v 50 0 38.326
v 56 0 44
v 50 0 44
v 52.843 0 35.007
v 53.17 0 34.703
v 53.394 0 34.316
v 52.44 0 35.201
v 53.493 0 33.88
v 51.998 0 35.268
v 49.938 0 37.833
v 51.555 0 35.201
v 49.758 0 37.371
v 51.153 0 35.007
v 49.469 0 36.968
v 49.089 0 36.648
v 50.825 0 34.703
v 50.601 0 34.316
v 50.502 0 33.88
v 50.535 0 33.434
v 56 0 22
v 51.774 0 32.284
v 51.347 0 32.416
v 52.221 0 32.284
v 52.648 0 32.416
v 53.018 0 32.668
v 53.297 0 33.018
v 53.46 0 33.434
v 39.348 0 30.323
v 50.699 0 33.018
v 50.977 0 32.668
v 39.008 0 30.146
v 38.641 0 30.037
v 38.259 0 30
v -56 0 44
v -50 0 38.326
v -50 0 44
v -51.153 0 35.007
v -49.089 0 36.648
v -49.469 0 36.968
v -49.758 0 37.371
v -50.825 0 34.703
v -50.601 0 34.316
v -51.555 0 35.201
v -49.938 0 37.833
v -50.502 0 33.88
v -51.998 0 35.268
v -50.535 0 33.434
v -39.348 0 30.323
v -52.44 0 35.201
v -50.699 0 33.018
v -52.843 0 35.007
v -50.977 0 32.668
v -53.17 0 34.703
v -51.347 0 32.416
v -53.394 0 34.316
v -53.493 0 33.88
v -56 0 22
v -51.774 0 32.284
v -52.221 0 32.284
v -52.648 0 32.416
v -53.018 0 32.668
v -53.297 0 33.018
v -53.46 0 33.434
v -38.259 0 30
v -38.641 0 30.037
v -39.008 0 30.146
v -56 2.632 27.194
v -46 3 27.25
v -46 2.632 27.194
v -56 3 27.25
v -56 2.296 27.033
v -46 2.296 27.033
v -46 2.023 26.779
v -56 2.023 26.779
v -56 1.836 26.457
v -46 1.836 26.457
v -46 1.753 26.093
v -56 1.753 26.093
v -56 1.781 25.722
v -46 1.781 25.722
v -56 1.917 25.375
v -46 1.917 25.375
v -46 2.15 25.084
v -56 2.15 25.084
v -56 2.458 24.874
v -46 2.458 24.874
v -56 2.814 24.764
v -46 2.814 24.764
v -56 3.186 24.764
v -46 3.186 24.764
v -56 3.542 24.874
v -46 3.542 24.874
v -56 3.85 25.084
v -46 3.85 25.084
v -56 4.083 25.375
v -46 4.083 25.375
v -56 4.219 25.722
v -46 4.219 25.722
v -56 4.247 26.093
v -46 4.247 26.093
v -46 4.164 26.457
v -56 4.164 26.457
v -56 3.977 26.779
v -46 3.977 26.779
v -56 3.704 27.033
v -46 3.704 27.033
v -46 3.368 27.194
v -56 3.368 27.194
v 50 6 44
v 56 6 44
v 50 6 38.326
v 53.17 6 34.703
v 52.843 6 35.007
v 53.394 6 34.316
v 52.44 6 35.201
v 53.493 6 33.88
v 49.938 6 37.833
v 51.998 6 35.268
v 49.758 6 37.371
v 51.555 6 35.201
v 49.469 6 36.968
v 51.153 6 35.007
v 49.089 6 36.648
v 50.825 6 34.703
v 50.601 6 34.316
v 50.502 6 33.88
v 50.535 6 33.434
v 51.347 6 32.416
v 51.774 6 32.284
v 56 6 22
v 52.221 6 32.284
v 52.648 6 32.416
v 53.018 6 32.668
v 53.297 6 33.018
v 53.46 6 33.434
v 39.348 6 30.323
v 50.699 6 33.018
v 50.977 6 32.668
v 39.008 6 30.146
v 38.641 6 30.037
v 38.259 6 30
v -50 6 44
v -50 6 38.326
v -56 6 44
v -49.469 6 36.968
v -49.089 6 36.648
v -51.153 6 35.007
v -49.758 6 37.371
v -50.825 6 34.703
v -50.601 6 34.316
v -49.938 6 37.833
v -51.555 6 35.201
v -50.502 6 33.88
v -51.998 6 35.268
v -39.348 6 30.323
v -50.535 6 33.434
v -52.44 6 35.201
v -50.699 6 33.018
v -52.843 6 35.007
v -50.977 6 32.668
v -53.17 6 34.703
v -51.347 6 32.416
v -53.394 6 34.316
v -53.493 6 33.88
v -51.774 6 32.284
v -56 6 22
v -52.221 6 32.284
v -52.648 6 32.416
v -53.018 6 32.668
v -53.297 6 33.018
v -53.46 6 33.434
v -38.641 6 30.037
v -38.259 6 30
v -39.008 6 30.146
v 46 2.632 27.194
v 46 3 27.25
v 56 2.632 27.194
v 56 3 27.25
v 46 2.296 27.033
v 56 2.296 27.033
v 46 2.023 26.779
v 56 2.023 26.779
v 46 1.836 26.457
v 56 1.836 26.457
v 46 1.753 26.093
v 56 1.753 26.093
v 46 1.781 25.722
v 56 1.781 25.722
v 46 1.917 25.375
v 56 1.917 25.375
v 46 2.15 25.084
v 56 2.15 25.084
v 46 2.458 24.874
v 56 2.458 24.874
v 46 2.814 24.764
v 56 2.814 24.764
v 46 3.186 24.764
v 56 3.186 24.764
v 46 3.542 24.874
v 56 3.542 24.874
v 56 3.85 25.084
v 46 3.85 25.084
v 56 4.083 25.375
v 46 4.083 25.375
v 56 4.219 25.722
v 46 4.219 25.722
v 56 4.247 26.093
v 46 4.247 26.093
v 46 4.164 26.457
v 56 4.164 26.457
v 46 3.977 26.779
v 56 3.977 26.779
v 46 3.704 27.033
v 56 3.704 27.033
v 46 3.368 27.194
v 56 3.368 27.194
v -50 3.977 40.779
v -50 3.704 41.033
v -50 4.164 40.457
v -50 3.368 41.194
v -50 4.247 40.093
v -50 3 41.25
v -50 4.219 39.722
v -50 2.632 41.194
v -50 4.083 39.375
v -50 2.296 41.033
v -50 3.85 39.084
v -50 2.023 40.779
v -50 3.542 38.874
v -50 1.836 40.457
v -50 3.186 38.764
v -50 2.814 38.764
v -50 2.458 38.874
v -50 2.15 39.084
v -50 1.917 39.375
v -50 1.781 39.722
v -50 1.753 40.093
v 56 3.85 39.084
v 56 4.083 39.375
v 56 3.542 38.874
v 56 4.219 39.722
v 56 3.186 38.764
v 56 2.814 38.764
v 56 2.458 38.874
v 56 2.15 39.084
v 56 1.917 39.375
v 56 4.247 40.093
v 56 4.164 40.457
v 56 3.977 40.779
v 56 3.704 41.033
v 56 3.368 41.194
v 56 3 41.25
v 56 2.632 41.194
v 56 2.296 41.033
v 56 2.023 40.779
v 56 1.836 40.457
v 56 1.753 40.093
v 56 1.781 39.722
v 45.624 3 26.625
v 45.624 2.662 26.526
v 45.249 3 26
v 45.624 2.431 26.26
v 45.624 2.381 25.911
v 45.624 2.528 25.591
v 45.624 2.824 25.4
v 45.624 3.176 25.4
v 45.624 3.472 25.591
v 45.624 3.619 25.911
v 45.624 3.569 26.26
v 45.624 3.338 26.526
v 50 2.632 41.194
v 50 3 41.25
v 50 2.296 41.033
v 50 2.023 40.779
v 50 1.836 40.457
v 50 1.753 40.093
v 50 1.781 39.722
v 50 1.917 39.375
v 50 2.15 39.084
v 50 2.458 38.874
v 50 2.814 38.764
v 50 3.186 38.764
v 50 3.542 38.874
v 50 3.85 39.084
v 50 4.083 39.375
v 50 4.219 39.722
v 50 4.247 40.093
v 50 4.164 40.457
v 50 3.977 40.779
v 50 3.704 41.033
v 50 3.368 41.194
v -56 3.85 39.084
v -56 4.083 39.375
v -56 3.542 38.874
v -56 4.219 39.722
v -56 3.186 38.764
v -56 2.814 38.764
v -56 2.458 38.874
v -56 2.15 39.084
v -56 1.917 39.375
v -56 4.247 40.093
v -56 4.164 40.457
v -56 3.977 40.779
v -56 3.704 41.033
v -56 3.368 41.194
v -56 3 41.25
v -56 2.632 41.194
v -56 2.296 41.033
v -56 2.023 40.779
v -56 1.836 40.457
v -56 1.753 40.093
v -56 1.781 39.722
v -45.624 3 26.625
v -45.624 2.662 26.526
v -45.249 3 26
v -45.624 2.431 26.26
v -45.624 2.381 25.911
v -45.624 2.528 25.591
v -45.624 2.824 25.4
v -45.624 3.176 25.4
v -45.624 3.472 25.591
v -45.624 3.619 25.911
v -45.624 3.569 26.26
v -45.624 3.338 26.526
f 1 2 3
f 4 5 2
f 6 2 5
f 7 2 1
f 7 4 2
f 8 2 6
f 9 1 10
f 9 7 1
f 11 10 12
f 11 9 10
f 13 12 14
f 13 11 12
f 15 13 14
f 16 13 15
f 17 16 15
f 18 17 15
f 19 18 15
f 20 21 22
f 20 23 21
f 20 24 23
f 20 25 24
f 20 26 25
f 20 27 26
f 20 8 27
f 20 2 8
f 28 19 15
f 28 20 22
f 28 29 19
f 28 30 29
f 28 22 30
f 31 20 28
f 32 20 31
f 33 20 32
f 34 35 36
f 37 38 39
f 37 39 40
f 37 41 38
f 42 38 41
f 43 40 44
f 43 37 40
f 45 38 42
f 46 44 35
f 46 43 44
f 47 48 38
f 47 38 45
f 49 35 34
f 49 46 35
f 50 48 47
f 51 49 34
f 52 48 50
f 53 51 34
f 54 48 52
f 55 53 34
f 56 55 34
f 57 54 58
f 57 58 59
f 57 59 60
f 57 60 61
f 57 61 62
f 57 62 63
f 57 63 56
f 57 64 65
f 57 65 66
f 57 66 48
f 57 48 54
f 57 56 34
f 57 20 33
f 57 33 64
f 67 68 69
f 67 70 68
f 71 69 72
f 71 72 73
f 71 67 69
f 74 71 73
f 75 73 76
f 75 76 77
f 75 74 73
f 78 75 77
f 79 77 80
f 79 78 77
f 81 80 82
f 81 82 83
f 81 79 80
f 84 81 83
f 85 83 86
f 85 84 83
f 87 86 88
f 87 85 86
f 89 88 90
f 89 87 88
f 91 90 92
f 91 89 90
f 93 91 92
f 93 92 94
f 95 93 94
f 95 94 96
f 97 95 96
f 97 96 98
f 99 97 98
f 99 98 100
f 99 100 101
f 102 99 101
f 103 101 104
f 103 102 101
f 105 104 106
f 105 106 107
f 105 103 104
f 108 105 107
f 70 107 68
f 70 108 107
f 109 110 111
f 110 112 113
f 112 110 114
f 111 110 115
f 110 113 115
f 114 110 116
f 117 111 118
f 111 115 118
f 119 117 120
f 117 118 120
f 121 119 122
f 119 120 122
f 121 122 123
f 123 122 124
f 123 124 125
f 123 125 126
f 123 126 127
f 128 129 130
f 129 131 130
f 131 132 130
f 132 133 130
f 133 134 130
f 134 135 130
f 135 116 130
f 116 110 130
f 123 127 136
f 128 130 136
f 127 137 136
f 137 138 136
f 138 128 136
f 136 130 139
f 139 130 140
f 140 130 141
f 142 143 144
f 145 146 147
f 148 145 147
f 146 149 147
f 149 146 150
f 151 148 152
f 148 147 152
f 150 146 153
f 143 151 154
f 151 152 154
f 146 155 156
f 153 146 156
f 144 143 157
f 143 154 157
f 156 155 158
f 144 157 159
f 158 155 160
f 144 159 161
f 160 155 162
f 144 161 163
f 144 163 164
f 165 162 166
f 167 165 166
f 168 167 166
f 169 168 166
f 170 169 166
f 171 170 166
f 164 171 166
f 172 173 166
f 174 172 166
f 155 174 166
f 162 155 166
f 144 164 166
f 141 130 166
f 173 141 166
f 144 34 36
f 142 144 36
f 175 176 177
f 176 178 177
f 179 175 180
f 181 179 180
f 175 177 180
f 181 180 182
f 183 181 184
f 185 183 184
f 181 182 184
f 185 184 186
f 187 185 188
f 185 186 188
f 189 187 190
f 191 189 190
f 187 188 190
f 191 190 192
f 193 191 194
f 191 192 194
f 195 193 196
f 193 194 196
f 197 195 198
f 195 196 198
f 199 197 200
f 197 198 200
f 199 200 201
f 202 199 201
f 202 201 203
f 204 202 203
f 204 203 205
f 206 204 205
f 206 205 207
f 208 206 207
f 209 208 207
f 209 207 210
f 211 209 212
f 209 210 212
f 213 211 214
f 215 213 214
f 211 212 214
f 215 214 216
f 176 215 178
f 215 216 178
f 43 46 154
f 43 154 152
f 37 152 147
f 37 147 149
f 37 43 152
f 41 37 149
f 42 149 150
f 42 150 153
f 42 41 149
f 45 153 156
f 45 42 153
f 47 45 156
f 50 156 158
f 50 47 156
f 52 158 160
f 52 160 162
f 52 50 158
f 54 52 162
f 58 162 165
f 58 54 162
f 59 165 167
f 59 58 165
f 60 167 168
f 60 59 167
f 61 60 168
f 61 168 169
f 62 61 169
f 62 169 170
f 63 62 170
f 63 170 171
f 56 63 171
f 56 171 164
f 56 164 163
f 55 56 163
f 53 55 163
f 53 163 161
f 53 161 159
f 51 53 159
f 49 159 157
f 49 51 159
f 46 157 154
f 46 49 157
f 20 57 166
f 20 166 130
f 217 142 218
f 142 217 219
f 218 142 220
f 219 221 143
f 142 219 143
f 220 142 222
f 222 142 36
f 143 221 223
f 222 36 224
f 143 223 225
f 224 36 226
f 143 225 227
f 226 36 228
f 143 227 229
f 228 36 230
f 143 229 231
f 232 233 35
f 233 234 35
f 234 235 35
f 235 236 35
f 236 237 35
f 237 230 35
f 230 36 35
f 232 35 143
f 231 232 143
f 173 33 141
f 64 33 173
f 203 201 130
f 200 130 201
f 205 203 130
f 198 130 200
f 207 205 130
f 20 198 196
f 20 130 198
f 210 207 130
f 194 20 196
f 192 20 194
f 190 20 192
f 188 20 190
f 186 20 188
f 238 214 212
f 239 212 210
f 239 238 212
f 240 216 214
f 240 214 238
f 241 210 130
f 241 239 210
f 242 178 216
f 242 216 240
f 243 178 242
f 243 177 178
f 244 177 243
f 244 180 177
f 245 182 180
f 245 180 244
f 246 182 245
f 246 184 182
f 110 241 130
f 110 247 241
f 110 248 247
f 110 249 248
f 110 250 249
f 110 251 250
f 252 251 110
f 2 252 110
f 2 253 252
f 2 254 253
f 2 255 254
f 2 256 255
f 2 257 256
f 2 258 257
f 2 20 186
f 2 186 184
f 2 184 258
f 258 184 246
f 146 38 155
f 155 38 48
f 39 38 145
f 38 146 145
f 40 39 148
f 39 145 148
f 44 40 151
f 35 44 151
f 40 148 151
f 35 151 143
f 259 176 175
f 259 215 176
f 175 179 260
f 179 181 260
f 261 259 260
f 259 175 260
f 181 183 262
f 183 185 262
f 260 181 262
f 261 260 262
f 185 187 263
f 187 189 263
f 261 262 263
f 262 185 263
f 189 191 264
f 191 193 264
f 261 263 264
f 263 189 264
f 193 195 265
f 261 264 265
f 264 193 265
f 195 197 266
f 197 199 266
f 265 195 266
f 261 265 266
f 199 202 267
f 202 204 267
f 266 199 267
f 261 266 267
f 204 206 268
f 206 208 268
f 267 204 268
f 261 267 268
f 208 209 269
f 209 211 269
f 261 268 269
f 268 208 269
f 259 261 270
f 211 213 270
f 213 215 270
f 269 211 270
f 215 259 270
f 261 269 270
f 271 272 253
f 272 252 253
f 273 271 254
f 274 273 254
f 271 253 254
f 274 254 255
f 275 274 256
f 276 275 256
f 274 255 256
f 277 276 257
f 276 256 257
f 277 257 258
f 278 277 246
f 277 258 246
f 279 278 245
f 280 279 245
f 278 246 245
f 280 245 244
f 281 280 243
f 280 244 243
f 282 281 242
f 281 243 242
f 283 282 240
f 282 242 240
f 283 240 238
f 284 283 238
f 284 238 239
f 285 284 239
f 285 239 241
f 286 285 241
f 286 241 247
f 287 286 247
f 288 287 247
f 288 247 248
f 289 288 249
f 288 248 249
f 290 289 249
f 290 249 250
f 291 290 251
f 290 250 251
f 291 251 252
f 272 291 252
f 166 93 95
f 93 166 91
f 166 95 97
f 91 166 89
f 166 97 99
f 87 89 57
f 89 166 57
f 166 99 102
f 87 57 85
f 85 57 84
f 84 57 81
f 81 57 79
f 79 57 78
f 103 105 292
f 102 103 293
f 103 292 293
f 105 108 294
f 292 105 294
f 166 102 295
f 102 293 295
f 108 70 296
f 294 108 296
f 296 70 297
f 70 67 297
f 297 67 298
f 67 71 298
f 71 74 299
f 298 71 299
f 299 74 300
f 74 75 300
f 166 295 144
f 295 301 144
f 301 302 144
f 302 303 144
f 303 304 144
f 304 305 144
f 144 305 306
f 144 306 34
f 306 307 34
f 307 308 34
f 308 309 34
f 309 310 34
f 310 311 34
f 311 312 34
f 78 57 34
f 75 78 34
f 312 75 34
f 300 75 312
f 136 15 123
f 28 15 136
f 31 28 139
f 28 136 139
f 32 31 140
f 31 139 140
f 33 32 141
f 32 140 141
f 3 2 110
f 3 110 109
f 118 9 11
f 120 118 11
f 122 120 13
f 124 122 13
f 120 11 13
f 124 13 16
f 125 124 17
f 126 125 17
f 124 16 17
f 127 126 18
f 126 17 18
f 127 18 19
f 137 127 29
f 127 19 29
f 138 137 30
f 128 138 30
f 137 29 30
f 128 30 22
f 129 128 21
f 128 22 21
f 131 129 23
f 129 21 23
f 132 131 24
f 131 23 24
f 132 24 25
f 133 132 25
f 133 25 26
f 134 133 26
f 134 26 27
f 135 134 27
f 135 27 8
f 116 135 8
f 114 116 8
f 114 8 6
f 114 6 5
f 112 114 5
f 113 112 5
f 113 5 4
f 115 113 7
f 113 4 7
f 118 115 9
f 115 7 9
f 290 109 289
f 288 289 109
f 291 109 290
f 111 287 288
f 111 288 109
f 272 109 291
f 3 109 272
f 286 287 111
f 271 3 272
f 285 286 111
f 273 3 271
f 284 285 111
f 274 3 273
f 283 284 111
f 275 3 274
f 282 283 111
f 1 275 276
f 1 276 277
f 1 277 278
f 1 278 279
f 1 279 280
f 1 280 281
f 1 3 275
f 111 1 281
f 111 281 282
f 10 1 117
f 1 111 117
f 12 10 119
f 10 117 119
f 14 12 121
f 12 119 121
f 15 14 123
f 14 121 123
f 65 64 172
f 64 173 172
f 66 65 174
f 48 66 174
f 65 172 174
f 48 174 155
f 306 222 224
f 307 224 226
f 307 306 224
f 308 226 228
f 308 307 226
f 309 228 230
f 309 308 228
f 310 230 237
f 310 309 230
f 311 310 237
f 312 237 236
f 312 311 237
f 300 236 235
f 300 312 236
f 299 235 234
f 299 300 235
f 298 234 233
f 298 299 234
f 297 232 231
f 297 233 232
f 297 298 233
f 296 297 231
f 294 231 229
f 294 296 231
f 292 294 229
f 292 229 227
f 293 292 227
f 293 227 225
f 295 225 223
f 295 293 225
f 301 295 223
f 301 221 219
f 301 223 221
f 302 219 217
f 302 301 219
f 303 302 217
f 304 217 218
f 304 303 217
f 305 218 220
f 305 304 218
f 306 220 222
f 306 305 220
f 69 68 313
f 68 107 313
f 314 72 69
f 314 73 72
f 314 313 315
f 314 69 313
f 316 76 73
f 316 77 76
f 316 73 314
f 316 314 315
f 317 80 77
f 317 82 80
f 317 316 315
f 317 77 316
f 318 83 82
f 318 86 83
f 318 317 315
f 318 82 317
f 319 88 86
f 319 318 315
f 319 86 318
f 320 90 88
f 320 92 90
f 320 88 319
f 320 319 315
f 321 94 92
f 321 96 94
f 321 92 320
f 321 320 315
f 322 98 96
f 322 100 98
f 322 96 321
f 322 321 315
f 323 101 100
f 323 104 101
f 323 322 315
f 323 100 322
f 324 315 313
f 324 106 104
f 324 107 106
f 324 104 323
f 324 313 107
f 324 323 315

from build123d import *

# Parameters (mm, degrees)
SKETCH1_R                        = 1.5
BOSS_EXTRUDE1_DEPTH              = 6
FILLET1_R                        = 2
TAP_DRILL_FOR_M3_TAP1_AT_2_COUNT = 2
TAP_DRILL_FOR_M3_TAP1_AT_2_PITCH = 14
FILLET1_OF_MIRROR1_R             = 2


with BuildPart() as part:
    # Sketch1 → Boss-Extrude1 (new body)
    with BuildSketch(Plane(origin=(0, 0, 0), x_dir=(1, 0, 0), z_dir=(0, 1, 0))):
        Polygon((0, -22), (-56, -22), (-56, -44), (-50, -44), (-50, -37.239832831), (-38.851635079, -30), (0, -30), align=None)
        with Locations(Location((-51.997575213, -33.767620171, 0), (0, 0, 270))):
            Circle(SKETCH1_R, mode=Mode.SUBTRACT)
    boss_extrude1 = extrude(amount=BOSS_EXTRUDE1_DEPTH)

    # Fillet1
    fillet1_edges = [part.edges().sort_by_distance(p)[0] for p in [
        (-38.851635079, 3, 30),
        (-50, 3, 37.239832831),
    ]]
    fillet(fillet1_edges, radius=FILLET1_R)

    # Sketch2 → Tap Drill for M3 Tap1 (revolve, cut)
    with BuildSketch(Plane(origin=(-56, 3, 26), x_dir=(0, 0, 1), z_dir=(0, 1, 0))):
        Polygon((0, 0), (0, 10.751075774), (1.25, 10), (1.25, 0), align=None)
    tap_drill_for_m3_tap1 = revolve(axis=Axis((-62.35, 3, 26), (1, 0, 0)), mode=Mode.SUBTRACT)

    # Tap Drill for M3 Tap1 at 2: Tap Drill for M3 Tap1 ×2
    with Locations(*[(0, 0, i * TAP_DRILL_FOR_M3_TAP1_AT_2_PITCH) for i in range(1, TAP_DRILL_FOR_M3_TAP1_AT_2_COUNT)]):
        add(tap_drill_for_m3_tap1, mode=Mode.SUBTRACT)

    # Mirror1: Boss-Extrude1, Tap Drill for M3 Tap1 across plane
    add(boss_extrude1.mirror(Plane(origin=(0, 6, 30), x_dir=(0, 0, 1), z_dir=(-1, 0, 0))))
    add(tap_drill_for_m3_tap1.mirror(Plane(origin=(0, 6, 30), x_dir=(0, 0, 1), z_dir=(-1, 0, 0))), mode=Mode.SUBTRACT)

    # Mirror1 copy 1 sketch → Mirror1 copy 1 (revolve, cut)
    with BuildSketch(Plane(origin=(56, 3, 40), x_dir=(0, 0, 1), z_dir=(0, 1, 0))):
        Polygon((0, 0), (0, -10.751075774), (1.25, -10), (1.25, 0), align=None)
    revolve(axis=Axis((62.35, 3, 40), (1, 0, 0)), mode=Mode.SUBTRACT)

    # Fillet1 of Mirror1
    fillet1_of_mirror1_edges = [part.edges().sort_by_distance(p)[0] for p in [
        (38.851635079, 3, 30),
        (50, 3, 37.239832831),
    ]]
    fillet(fillet1_of_mirror1_edges, radius=FILLET1_OF_MIRROR1_R)


solid = part.part
